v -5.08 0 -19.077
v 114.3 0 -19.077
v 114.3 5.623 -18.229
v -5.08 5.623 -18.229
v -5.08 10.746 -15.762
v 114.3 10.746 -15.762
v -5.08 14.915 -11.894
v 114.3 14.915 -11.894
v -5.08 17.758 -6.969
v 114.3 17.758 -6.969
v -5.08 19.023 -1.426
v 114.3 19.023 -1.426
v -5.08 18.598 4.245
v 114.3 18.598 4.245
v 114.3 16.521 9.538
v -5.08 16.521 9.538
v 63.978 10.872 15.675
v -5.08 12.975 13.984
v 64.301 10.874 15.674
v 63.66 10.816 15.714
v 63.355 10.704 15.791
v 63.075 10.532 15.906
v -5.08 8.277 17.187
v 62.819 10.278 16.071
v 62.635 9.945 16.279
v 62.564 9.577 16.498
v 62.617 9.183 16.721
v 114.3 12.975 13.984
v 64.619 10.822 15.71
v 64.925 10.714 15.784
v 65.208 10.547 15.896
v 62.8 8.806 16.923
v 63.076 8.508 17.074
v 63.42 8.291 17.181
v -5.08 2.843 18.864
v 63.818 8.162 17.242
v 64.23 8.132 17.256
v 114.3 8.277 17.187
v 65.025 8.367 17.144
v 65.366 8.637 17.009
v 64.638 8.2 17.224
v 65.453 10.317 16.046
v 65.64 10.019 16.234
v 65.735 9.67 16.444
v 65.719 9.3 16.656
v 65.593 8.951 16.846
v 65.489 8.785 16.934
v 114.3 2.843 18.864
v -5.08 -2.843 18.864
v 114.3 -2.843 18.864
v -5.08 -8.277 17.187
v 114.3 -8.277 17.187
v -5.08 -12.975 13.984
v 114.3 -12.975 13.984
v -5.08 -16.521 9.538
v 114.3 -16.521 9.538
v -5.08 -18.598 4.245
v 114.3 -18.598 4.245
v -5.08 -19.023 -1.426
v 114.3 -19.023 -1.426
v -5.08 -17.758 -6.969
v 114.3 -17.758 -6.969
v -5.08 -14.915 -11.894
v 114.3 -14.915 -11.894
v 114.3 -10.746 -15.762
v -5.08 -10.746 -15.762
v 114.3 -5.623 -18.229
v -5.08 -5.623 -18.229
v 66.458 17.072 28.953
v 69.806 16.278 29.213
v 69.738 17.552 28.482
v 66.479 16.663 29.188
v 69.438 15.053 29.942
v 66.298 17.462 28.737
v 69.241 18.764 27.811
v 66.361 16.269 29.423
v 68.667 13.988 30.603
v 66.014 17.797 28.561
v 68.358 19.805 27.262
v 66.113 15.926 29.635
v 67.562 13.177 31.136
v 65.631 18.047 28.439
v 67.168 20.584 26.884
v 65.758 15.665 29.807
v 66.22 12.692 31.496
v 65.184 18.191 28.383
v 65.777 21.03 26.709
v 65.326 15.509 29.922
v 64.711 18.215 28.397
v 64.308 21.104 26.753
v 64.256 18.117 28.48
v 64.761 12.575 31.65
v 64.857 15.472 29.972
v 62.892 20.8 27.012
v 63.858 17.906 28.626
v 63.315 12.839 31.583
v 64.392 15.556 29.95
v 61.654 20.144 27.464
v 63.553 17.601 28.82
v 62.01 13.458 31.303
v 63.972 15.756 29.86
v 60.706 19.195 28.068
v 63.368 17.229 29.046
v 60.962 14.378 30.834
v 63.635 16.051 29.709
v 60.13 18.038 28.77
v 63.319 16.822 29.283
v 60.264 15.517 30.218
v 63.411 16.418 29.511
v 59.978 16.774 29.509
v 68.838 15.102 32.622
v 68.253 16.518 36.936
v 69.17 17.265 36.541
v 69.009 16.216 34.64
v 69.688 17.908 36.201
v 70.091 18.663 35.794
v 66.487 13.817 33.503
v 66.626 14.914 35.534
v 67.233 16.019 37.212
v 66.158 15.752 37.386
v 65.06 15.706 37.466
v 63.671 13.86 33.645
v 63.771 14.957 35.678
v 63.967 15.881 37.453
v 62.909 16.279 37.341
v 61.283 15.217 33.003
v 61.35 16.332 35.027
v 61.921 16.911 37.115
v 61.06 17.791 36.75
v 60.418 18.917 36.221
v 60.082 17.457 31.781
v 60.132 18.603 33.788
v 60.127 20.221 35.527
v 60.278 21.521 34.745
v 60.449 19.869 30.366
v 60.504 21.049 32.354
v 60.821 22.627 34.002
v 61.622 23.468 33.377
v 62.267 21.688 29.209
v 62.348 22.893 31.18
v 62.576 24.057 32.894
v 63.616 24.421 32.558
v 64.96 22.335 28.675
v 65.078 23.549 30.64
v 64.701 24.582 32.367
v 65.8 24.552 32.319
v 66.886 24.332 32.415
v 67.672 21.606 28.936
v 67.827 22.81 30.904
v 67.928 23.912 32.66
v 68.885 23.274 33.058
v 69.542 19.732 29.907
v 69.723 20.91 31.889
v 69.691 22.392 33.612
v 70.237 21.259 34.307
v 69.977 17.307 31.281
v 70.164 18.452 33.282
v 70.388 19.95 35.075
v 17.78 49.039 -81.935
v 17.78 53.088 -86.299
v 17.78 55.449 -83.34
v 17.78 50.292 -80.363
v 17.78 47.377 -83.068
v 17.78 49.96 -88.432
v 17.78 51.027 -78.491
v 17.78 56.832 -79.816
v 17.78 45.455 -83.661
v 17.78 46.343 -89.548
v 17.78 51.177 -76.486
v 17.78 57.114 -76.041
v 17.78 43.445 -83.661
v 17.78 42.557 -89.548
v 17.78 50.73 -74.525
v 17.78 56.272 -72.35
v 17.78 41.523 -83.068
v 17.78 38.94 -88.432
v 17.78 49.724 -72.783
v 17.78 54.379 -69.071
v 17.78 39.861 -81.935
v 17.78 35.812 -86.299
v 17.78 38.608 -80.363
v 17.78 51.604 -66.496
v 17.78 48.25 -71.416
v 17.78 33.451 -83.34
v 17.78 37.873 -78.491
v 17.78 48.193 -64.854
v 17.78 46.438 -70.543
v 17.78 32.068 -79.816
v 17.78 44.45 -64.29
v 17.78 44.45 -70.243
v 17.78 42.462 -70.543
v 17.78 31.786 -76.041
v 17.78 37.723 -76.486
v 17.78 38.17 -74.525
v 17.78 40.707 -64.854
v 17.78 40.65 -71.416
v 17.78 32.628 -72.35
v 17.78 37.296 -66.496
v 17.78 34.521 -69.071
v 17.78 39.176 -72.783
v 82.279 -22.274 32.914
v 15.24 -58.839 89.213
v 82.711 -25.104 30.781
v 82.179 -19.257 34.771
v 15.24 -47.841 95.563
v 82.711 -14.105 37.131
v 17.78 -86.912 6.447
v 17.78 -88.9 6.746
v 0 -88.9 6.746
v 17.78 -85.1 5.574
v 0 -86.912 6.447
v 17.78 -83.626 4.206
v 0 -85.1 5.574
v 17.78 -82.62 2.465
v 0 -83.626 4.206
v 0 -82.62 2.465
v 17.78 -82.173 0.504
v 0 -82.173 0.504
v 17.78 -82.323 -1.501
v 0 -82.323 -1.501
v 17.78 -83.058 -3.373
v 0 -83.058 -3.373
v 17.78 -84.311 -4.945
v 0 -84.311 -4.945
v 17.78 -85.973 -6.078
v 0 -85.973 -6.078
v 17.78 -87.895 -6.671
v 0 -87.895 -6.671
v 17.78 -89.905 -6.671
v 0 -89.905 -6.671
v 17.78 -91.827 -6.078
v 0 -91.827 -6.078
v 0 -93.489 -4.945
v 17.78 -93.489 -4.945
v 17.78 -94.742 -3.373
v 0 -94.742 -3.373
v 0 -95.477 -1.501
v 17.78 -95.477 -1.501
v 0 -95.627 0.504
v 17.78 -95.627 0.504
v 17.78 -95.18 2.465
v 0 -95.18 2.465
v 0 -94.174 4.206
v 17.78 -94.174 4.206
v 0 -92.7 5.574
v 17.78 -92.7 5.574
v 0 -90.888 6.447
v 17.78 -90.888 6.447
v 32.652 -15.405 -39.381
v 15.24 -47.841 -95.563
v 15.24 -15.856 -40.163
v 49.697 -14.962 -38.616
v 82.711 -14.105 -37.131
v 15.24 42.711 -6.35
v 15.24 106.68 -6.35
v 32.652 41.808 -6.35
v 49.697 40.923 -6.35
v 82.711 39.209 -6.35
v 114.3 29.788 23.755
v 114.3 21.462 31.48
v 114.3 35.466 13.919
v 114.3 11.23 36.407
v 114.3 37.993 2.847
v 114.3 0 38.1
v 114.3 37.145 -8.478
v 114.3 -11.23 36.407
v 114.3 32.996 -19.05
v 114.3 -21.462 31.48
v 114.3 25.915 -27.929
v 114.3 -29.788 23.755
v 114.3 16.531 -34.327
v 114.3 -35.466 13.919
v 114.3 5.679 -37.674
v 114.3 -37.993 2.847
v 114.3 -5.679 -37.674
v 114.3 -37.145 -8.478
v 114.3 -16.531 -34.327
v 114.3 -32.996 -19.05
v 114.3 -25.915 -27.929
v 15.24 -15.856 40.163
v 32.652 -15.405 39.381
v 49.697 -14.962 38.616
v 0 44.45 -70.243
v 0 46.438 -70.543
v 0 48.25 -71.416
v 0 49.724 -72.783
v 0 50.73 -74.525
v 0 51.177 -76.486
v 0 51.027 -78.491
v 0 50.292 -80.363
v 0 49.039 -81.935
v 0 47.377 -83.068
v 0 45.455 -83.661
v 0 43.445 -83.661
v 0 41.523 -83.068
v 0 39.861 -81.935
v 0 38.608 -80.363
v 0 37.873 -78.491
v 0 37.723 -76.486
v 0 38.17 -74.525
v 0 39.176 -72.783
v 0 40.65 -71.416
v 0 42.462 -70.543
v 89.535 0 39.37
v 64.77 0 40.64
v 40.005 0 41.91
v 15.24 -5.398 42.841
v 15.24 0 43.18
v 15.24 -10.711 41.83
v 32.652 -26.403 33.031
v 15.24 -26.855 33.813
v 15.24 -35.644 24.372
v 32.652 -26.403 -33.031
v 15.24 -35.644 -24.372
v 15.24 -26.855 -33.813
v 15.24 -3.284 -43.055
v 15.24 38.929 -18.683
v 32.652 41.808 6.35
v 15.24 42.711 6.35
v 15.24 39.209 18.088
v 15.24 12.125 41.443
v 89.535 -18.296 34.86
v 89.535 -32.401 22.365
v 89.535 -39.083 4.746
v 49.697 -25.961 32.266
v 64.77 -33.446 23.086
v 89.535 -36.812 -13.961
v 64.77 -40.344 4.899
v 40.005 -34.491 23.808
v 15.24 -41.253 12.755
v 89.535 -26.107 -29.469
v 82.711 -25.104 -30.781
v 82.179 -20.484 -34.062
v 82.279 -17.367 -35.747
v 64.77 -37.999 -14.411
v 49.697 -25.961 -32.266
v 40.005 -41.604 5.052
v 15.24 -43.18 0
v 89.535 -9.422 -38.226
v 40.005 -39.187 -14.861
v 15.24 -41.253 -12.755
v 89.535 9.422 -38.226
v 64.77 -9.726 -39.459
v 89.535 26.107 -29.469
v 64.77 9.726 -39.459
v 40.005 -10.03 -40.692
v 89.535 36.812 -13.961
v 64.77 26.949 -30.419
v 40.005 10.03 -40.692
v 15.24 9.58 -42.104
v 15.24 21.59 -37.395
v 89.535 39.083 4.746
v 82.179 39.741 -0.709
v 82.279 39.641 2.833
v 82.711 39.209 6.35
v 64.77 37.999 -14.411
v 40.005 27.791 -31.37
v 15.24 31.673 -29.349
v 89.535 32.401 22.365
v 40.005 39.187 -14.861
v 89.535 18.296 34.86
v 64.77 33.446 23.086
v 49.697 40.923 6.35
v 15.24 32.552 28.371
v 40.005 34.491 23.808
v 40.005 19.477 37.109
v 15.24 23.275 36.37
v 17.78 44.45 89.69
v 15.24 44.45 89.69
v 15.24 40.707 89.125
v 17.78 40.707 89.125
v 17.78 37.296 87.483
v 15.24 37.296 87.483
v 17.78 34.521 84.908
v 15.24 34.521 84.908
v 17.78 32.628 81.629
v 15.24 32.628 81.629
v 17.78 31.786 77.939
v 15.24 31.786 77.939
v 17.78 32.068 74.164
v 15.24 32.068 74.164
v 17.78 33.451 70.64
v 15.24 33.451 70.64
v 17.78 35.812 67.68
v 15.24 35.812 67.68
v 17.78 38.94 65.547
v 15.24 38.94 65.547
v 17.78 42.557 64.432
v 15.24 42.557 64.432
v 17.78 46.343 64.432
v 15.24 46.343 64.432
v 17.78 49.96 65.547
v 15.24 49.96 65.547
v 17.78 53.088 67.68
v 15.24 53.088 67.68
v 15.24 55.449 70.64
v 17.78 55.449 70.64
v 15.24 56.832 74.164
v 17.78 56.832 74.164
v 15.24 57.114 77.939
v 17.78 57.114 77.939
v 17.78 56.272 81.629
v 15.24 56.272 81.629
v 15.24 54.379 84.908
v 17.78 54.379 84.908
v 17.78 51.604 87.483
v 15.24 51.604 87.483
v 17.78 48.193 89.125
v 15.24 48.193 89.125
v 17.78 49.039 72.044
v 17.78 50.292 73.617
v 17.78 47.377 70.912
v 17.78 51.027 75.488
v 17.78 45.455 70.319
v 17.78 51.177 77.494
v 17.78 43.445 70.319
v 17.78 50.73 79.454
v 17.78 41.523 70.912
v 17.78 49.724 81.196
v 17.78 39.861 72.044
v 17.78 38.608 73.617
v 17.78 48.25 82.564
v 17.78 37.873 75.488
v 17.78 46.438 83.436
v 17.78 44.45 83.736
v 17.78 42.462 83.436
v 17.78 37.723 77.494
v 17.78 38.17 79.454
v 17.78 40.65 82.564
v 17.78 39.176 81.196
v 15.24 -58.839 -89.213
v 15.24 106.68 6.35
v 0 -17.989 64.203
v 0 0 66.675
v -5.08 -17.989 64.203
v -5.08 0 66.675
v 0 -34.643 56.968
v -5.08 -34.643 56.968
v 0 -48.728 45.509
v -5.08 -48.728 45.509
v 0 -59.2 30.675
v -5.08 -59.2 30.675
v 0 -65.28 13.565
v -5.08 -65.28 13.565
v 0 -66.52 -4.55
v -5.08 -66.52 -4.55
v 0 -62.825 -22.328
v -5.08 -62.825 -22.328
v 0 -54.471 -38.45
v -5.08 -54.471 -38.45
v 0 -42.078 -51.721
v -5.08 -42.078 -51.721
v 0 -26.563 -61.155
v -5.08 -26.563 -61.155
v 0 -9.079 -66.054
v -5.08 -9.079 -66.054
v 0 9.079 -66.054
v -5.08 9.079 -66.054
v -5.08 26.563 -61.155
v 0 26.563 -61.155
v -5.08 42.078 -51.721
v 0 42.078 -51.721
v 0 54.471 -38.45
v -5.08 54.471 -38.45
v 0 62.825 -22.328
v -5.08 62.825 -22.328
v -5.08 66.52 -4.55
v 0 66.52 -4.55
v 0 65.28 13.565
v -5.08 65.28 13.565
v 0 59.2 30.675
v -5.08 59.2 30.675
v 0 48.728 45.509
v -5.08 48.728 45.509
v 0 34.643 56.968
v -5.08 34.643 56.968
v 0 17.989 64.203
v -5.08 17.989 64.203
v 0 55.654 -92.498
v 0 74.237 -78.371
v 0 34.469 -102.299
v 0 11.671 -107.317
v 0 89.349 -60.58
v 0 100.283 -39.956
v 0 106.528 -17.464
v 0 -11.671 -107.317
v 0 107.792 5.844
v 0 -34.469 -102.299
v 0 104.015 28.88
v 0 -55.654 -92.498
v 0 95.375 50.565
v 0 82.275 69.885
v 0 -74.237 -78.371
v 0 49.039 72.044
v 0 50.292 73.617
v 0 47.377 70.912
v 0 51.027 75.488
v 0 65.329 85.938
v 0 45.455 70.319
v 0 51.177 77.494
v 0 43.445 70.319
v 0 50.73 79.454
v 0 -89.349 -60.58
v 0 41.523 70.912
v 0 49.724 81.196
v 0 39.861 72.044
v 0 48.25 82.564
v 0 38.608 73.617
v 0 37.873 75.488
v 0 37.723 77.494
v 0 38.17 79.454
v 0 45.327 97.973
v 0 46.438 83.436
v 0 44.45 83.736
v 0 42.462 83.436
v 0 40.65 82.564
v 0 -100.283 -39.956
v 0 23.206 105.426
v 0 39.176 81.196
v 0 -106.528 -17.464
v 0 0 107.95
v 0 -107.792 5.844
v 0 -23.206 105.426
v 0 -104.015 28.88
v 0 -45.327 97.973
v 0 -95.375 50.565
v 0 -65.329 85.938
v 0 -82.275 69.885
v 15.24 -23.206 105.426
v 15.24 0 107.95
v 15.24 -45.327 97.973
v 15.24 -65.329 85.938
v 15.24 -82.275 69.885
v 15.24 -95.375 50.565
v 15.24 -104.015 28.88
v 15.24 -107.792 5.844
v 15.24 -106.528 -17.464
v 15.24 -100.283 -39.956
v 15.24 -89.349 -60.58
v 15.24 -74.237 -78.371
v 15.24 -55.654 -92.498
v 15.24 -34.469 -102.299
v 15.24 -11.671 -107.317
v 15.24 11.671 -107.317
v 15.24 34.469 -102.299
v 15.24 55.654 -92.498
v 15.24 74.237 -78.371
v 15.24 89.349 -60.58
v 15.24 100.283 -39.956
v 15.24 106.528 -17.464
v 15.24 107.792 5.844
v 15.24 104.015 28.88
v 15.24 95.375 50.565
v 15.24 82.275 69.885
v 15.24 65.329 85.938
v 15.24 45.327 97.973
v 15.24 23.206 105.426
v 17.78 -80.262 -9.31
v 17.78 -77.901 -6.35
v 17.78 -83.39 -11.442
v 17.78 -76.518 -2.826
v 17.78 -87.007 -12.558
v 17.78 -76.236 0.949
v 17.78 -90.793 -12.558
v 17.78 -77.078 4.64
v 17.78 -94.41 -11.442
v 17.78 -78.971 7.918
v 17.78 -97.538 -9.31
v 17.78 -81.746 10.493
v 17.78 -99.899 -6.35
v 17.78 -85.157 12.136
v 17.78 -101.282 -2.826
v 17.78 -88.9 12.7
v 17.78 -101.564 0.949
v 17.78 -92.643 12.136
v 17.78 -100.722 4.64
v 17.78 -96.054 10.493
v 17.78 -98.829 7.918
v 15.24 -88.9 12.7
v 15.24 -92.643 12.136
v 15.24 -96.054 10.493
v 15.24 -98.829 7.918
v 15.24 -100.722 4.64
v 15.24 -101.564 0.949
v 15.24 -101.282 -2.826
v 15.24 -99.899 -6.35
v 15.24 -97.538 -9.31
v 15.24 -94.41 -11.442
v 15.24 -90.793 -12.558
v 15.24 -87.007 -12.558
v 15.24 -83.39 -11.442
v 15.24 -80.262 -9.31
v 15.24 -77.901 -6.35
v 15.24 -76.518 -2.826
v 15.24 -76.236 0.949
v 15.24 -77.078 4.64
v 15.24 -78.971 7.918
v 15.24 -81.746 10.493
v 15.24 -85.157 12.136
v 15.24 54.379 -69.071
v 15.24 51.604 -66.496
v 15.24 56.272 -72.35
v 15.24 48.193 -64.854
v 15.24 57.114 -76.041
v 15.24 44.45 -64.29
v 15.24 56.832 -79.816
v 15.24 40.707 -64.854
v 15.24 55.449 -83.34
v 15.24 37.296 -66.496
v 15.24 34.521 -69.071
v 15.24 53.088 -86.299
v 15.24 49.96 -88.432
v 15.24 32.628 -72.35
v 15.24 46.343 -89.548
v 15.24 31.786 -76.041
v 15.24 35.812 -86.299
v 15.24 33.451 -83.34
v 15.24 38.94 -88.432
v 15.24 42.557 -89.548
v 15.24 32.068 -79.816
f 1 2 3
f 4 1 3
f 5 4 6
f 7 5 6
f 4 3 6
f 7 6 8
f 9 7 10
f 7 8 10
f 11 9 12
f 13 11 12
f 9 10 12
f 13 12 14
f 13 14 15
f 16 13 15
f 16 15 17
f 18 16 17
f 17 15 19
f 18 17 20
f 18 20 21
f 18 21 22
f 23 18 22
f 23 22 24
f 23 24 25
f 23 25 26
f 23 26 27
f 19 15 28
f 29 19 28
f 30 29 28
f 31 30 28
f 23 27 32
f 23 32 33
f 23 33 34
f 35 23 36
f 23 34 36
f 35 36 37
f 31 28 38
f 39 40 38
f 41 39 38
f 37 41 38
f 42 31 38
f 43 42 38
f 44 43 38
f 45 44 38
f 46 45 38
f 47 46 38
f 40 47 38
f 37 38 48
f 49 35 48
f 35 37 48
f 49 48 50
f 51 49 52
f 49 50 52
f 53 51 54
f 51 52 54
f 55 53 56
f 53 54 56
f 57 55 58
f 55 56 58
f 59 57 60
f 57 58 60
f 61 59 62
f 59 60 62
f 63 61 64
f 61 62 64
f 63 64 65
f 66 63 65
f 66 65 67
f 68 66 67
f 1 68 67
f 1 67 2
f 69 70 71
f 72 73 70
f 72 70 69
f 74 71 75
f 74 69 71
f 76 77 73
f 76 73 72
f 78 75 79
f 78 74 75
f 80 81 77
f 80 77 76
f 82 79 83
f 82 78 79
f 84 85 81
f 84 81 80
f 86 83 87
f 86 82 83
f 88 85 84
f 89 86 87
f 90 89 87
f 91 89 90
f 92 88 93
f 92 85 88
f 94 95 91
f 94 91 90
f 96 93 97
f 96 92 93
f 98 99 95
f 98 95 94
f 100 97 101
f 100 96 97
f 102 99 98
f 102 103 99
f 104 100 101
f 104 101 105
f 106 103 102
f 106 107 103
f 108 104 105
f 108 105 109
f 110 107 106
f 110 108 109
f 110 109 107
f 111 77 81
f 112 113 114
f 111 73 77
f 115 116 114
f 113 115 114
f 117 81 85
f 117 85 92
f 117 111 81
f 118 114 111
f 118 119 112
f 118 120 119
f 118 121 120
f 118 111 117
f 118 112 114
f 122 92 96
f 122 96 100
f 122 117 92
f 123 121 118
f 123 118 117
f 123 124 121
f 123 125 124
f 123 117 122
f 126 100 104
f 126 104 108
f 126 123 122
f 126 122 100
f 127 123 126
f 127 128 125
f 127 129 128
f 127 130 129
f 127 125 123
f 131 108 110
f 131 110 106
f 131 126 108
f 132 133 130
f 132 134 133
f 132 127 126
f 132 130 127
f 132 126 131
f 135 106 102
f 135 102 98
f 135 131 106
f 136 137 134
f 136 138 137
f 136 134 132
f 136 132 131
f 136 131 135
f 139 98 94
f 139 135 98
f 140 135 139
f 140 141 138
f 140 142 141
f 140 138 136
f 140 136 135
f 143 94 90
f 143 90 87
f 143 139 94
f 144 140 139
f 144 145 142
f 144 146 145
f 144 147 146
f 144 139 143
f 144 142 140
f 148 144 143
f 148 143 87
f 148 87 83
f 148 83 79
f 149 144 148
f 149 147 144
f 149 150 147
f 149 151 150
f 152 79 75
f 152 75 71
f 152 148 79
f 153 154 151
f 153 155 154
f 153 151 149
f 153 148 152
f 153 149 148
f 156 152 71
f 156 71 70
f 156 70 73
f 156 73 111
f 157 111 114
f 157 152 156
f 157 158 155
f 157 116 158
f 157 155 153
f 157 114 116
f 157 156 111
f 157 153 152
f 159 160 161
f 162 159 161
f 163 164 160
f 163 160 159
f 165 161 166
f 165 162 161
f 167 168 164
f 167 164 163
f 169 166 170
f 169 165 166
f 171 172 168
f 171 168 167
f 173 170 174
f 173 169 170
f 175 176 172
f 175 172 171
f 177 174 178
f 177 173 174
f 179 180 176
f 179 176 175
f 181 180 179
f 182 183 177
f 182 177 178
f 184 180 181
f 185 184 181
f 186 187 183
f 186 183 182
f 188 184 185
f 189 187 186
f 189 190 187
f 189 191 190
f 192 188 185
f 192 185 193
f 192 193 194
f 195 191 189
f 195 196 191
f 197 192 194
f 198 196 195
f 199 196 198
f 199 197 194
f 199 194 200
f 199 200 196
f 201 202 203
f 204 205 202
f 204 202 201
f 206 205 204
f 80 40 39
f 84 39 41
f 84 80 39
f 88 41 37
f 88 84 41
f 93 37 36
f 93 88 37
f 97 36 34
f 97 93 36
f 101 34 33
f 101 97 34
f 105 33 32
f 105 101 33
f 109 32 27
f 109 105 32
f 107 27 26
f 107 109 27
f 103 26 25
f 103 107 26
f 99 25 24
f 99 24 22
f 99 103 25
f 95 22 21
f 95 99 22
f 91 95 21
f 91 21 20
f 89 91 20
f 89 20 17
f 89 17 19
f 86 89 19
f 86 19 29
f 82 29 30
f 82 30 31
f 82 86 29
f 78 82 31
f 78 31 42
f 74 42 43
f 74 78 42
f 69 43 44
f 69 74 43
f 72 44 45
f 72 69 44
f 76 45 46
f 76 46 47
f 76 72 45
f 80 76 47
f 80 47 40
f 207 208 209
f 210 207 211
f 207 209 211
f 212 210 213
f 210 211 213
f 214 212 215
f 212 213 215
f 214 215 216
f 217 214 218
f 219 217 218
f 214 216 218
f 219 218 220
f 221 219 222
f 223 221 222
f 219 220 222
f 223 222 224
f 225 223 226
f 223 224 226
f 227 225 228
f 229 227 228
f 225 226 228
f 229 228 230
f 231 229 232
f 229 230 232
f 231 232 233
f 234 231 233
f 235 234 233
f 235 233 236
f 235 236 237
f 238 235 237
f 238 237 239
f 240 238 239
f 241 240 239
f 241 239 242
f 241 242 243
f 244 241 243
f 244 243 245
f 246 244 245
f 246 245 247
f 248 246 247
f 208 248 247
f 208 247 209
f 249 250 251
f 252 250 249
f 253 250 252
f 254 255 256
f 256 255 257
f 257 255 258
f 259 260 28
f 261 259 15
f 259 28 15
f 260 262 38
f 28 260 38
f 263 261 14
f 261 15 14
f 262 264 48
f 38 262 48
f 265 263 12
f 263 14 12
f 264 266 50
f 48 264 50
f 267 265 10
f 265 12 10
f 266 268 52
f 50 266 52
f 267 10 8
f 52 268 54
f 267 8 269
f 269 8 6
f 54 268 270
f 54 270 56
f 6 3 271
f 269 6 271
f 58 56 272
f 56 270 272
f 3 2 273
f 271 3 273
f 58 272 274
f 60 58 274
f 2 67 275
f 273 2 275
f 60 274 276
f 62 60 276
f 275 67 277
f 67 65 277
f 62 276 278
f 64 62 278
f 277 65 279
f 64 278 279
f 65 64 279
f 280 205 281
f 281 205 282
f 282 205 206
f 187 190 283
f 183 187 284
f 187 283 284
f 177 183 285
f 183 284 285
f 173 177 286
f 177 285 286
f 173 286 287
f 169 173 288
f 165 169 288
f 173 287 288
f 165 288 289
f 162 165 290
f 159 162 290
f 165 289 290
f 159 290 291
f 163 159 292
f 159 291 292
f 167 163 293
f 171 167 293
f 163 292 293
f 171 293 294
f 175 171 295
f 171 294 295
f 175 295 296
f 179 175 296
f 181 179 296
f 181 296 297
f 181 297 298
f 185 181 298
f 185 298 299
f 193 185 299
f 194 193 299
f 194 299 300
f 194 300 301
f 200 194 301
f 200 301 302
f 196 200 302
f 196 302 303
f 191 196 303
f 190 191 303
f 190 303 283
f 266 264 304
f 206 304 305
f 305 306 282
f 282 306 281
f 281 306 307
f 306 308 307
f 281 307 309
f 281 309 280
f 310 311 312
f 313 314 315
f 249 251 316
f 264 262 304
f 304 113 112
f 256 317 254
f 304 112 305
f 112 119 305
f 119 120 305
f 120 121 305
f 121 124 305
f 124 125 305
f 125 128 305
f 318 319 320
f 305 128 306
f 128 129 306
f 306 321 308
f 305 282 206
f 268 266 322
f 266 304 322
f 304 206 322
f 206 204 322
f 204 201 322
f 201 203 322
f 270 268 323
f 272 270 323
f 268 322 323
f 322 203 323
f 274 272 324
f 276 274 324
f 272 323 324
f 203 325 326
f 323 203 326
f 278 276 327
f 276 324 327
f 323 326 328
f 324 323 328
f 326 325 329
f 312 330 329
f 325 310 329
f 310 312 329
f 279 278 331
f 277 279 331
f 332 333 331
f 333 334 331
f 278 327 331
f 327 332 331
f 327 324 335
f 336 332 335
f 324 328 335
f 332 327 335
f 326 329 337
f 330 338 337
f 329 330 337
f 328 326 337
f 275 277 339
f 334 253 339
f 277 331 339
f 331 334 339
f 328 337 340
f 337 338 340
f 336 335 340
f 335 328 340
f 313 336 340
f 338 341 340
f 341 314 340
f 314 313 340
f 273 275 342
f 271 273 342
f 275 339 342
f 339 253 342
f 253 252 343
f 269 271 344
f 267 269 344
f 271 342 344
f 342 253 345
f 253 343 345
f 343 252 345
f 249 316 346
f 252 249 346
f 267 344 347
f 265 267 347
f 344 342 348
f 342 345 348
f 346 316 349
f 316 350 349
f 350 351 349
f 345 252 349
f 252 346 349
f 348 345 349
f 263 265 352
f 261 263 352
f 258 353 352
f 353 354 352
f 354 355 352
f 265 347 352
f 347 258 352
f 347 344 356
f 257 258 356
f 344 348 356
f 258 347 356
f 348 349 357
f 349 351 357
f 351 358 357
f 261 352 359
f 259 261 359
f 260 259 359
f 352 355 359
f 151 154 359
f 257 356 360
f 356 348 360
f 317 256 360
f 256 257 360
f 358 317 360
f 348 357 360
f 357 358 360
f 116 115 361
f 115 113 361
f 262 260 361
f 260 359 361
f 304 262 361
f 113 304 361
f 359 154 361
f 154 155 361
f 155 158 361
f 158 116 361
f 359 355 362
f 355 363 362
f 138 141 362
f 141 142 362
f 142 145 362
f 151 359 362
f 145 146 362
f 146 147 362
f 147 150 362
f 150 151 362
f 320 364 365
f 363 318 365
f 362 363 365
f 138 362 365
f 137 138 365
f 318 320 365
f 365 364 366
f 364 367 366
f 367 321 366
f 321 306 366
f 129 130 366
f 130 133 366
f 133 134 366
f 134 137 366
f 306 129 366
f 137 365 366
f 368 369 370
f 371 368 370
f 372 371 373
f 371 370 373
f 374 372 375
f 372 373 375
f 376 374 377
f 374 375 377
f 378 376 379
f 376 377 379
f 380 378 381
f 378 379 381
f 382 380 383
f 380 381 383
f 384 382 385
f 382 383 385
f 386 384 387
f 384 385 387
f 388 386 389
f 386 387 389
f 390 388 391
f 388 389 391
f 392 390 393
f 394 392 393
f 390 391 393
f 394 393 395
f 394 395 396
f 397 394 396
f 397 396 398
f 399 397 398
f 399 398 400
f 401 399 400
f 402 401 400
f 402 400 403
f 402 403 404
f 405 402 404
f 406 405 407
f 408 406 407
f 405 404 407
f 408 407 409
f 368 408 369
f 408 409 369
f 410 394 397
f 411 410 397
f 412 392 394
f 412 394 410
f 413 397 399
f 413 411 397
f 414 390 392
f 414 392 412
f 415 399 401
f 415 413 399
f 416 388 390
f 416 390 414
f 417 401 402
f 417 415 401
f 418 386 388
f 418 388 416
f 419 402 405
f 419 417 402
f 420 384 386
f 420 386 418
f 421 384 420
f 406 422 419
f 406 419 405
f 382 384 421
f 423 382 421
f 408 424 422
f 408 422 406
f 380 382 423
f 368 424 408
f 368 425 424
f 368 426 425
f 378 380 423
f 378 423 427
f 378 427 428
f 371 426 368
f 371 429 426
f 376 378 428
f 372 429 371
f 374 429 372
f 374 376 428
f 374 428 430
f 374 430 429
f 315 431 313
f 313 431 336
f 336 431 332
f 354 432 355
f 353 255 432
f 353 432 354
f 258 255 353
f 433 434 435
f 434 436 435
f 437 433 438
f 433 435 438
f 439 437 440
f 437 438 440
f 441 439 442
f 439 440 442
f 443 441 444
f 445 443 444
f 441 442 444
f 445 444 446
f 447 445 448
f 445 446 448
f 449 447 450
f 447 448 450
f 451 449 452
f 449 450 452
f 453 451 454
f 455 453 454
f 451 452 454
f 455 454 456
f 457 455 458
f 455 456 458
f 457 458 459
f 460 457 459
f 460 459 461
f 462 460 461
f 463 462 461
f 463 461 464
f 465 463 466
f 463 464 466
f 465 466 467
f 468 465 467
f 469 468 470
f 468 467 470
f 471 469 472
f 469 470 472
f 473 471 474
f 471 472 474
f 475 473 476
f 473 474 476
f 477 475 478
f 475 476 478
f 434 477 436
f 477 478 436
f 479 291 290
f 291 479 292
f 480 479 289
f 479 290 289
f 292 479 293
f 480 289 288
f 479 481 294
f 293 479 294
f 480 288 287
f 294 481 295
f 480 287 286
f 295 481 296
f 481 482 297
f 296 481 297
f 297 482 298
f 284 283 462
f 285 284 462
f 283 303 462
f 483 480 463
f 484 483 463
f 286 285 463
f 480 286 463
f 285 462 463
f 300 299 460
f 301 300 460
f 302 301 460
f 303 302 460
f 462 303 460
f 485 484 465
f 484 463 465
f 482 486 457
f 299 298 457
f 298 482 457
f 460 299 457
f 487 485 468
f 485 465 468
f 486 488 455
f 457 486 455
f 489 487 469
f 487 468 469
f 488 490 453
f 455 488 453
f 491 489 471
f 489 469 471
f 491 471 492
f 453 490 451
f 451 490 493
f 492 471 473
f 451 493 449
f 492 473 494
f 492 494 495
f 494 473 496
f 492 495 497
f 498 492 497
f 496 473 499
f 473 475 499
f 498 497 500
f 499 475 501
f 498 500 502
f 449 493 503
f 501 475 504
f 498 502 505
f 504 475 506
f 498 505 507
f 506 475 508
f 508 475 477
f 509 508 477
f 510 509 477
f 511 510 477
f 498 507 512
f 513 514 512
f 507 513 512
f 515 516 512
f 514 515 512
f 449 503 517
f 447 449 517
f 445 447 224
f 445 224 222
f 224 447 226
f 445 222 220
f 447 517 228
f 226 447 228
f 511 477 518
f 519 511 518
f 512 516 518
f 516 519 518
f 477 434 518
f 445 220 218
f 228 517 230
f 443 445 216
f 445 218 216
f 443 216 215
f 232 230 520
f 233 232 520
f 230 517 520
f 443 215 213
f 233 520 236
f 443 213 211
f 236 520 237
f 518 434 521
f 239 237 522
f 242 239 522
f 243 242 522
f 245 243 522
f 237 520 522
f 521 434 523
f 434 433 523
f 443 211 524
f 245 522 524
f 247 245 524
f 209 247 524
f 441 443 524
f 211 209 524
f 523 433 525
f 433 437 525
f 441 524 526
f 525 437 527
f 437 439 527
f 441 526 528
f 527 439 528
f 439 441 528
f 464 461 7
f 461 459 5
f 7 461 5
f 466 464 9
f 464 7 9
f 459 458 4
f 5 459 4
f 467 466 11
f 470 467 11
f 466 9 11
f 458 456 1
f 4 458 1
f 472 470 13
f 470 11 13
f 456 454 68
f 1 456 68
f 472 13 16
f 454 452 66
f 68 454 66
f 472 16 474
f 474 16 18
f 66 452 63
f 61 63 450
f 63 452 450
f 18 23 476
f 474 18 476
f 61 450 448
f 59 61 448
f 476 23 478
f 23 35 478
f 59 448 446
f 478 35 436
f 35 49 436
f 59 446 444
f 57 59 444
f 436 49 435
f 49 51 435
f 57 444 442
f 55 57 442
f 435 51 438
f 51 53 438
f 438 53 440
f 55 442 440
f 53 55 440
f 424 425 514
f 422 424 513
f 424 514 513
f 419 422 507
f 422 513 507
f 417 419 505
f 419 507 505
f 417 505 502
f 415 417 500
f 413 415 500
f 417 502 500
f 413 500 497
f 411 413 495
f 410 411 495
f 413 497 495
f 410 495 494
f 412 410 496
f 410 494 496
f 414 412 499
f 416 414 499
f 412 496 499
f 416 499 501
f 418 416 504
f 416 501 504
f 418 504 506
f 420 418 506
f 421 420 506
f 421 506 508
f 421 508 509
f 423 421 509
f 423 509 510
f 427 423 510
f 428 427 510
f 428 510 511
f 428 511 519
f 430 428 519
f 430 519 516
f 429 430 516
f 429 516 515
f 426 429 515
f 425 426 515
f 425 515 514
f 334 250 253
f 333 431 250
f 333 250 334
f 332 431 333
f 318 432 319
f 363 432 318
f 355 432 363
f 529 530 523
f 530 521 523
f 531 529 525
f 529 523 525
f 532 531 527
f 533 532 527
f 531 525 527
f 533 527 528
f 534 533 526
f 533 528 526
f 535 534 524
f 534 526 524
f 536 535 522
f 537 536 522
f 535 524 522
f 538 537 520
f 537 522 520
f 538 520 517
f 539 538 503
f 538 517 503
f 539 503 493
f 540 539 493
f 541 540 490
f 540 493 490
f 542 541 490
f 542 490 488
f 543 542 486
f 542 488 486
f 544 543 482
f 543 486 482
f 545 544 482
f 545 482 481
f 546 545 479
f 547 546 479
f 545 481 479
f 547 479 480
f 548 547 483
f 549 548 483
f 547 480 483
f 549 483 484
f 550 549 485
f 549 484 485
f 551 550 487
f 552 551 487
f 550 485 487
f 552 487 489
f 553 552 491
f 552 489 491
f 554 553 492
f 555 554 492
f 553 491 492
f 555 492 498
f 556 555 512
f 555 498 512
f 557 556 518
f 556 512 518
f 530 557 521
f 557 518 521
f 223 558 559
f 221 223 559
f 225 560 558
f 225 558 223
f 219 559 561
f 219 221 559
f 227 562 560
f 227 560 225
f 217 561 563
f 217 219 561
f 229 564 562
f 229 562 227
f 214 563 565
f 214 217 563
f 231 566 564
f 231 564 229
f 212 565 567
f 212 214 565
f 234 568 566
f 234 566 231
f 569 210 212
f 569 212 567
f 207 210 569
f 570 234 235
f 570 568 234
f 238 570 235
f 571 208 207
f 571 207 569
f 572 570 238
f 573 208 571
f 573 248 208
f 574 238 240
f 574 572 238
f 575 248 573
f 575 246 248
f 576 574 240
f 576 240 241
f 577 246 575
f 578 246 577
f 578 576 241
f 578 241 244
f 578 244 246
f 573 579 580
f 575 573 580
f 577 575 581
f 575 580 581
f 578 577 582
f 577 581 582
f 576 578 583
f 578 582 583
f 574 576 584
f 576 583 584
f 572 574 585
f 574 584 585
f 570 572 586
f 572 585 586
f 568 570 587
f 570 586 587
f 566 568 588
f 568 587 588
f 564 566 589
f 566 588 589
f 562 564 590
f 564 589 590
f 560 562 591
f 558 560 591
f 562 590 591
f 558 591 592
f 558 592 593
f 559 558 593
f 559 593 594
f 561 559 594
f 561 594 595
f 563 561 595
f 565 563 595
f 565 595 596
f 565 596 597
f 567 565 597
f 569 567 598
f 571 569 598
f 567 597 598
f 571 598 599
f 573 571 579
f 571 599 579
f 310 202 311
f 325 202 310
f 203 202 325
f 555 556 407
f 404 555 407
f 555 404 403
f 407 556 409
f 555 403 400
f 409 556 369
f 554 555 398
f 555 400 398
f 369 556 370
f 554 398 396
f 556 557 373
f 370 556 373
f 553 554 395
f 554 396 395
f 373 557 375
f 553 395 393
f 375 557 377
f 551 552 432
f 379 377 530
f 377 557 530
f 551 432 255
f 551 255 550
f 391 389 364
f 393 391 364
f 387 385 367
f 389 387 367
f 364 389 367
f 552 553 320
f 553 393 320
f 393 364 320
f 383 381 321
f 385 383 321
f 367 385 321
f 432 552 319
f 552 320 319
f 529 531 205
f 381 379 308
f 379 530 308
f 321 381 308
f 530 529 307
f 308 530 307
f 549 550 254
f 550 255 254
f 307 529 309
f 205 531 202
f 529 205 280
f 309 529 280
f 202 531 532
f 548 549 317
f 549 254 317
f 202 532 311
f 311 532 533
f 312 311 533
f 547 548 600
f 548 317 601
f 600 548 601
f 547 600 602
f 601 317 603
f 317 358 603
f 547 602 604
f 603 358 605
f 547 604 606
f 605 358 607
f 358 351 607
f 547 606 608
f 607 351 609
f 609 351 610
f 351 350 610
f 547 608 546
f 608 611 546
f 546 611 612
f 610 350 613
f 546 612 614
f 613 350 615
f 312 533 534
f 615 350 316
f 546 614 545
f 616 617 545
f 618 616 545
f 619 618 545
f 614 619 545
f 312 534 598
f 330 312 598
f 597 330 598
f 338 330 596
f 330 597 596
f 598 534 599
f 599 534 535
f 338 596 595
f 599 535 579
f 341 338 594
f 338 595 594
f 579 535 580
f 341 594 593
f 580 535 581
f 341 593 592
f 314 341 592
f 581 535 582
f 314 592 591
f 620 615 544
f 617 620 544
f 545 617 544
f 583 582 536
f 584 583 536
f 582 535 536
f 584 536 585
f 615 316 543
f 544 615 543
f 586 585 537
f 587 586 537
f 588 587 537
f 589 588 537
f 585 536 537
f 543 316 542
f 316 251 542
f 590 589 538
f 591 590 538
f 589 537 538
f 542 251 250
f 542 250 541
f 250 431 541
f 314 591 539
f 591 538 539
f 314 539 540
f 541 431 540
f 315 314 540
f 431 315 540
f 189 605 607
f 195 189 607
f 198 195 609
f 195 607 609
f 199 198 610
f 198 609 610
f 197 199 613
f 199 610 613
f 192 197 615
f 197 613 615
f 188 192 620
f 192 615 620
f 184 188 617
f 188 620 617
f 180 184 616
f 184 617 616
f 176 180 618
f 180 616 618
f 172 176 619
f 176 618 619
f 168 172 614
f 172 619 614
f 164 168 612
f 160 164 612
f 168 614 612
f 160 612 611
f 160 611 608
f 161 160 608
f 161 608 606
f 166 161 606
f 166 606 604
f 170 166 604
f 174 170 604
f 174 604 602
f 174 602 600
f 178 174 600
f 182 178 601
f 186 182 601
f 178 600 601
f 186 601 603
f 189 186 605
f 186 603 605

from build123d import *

# Parameters (mm, degrees)
RIB3_REACH              = 192.712
SKETCH5_WALL_W          = 478.079852118
SKETCH5_WALL_H          = 12.7
CIRPATTERN1_COUNT       = 3
SKETCH6_R               = 12.7
BOSS_EXTRUDE1_DEPTH     = 2.54
F_1_2_CLEARANCE_HOLE1_D = 13.49248
SKETCH14_R              = 19.07667
CUT_EXTRUDE1_DEPTH      = 194.798837458


with BuildPart() as part:
    # Sketch2 → Revolve2 (revolve)
    with BuildSketch(Plane.XY, mode=Mode.PRIVATE) as revolve2_sk:
        Polygon((0, 107.95), (0, 66.675), (-5.08, 66.675), (-5.08, 0), (114.3, 0), (114.3, 38.1), (15.24, 43.18), (15.24, 107.95), align=None)
    revolve(revolve2_sk.sketch.rotate(Axis((-82.761666667, 0, 0), (1, 0, 0)), 90), axis=Axis((-82.761666667, 0, 0), (1, 0, 0)))

    # Sketch5 wall → Rib3 (add, up to next)
    with BuildSketch(Plane(origin=(48.706216216, 73.213783784, 0), x_dir=(0.707106781187, -0.707106781187, 0), z_dir=(0.707106781187, 0.707106781187, 0)), mode=Mode.PRIVATE) as rib3_sk1:
        Rectangle(SKETCH5_WALL_W, SKETCH5_WALL_H)
    rib3_tool1 = extrude(rib3_sk1.sketch, amount=-RIB3_REACH, mode=Mode.PRIVATE) - part.part
    rib3 = rib3_tool1.solids().sort_by_distance((48.706216216, 73.213783784, 0))[0]
    add(rib3)

    # CirPattern1: Rib3 ×3 about axis
    cirpattern1_axis = Axis((0, 0, 0), (1, 0, 0))
    for i in range(1, CIRPATTERN1_COUNT):
        add(rib3.rotate(cirpattern1_axis, i * 360 / CIRPATTERN1_COUNT))

    # Sketch6 → Boss-Extrude1 (add)
    with BuildSketch(Plane(origin=(15.24, 0, 0), x_dir=(0, 0, -1), z_dir=(1, 0, 0))):
        with Locations(Location((76.989658396, 44.45, 0), (0, 0, 180))):
            Circle(SKETCH6_R)
        with Locations(Location((0, -88.9, 0), (0, 0, 180))):
            Circle(SKETCH6_R)
        with Locations(Location((-76.989658396, 44.45, 0), (0, 0, 180))):
            Circle(SKETCH6_R)
    extrude(amount=BOSS_EXTRUDE1_DEPTH)

    # 1/2 Clearance Hole1 (through all)
    with Locations(Plane(origin=(17.78, 0, 0), x_dir=(0, 0, -1), z_dir=(1, 0, 0))):
        with Locations((-76.989658396, 44.45), (76.989658396, 44.45), (0, -88.9)):
            Hole(F_1_2_CLEARANCE_HOLE1_D / 2)

    # Sketch13 → 1/8 NPT Tapped Hole1 (revolve, cut)
    with BuildSketch(Plane(origin=(65.257621207, 20.307496892, 35.173616392), x_dir=(0.7626361853665489, -0.5786990925818297, 0.28895226078805086), z_dir=(0.6447969431921082, 0.6447969431921082, -0.41045560551687754))):
        Polygon((0, 0), (0, 39.053866233), (1.5875, 38.1), (1.5875, 6.9342), (4.936185566, 6.9342), (5.1438048, 0), align=None)
    revolve(axis=Axis((65.582834882, 23.478330224, 40.665660824), (-0.05121475197315849, -0.4993438317382925, -0.8648888870168513)), mode=Mode.SUBTRACT)

    # Sketch14 → Cut-Extrude1 (cut, through all)
    with BuildSketch(Plane(origin=(114.3, 0, 0), x_dir=(0, 0, -1), z_dir=(1, 0, 0))):
        Circle(SKETCH14_R)
    extrude(amount=-CUT_EXTRUDE1_DEPTH, mode=Mode.SUBTRACT)


solid = part.part
